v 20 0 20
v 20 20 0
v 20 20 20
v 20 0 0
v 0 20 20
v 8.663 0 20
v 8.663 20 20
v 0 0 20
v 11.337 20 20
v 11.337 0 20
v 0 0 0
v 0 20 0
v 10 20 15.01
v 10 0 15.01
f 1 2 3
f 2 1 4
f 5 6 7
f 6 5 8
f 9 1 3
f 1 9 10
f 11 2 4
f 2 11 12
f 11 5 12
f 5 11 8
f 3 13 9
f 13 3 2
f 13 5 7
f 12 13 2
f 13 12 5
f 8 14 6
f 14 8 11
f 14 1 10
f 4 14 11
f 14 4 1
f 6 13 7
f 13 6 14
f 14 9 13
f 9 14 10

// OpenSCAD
// 20 mm block with a 30 deg V groove (5 mm deep) cut in the top: the groove bottom is a sharp
// CONCAVE edge, which is not a knife; every convex edge is >= 90 deg.
difference() {
  cube([20,20,20]);
  translate([0,20,20.01]) rotate([90,0,0]) linear_extrude(20) polygon([[10,-5],[10-5.01*tan(15),0.01],[10+5.01*tan(15),0.01]]);
}
